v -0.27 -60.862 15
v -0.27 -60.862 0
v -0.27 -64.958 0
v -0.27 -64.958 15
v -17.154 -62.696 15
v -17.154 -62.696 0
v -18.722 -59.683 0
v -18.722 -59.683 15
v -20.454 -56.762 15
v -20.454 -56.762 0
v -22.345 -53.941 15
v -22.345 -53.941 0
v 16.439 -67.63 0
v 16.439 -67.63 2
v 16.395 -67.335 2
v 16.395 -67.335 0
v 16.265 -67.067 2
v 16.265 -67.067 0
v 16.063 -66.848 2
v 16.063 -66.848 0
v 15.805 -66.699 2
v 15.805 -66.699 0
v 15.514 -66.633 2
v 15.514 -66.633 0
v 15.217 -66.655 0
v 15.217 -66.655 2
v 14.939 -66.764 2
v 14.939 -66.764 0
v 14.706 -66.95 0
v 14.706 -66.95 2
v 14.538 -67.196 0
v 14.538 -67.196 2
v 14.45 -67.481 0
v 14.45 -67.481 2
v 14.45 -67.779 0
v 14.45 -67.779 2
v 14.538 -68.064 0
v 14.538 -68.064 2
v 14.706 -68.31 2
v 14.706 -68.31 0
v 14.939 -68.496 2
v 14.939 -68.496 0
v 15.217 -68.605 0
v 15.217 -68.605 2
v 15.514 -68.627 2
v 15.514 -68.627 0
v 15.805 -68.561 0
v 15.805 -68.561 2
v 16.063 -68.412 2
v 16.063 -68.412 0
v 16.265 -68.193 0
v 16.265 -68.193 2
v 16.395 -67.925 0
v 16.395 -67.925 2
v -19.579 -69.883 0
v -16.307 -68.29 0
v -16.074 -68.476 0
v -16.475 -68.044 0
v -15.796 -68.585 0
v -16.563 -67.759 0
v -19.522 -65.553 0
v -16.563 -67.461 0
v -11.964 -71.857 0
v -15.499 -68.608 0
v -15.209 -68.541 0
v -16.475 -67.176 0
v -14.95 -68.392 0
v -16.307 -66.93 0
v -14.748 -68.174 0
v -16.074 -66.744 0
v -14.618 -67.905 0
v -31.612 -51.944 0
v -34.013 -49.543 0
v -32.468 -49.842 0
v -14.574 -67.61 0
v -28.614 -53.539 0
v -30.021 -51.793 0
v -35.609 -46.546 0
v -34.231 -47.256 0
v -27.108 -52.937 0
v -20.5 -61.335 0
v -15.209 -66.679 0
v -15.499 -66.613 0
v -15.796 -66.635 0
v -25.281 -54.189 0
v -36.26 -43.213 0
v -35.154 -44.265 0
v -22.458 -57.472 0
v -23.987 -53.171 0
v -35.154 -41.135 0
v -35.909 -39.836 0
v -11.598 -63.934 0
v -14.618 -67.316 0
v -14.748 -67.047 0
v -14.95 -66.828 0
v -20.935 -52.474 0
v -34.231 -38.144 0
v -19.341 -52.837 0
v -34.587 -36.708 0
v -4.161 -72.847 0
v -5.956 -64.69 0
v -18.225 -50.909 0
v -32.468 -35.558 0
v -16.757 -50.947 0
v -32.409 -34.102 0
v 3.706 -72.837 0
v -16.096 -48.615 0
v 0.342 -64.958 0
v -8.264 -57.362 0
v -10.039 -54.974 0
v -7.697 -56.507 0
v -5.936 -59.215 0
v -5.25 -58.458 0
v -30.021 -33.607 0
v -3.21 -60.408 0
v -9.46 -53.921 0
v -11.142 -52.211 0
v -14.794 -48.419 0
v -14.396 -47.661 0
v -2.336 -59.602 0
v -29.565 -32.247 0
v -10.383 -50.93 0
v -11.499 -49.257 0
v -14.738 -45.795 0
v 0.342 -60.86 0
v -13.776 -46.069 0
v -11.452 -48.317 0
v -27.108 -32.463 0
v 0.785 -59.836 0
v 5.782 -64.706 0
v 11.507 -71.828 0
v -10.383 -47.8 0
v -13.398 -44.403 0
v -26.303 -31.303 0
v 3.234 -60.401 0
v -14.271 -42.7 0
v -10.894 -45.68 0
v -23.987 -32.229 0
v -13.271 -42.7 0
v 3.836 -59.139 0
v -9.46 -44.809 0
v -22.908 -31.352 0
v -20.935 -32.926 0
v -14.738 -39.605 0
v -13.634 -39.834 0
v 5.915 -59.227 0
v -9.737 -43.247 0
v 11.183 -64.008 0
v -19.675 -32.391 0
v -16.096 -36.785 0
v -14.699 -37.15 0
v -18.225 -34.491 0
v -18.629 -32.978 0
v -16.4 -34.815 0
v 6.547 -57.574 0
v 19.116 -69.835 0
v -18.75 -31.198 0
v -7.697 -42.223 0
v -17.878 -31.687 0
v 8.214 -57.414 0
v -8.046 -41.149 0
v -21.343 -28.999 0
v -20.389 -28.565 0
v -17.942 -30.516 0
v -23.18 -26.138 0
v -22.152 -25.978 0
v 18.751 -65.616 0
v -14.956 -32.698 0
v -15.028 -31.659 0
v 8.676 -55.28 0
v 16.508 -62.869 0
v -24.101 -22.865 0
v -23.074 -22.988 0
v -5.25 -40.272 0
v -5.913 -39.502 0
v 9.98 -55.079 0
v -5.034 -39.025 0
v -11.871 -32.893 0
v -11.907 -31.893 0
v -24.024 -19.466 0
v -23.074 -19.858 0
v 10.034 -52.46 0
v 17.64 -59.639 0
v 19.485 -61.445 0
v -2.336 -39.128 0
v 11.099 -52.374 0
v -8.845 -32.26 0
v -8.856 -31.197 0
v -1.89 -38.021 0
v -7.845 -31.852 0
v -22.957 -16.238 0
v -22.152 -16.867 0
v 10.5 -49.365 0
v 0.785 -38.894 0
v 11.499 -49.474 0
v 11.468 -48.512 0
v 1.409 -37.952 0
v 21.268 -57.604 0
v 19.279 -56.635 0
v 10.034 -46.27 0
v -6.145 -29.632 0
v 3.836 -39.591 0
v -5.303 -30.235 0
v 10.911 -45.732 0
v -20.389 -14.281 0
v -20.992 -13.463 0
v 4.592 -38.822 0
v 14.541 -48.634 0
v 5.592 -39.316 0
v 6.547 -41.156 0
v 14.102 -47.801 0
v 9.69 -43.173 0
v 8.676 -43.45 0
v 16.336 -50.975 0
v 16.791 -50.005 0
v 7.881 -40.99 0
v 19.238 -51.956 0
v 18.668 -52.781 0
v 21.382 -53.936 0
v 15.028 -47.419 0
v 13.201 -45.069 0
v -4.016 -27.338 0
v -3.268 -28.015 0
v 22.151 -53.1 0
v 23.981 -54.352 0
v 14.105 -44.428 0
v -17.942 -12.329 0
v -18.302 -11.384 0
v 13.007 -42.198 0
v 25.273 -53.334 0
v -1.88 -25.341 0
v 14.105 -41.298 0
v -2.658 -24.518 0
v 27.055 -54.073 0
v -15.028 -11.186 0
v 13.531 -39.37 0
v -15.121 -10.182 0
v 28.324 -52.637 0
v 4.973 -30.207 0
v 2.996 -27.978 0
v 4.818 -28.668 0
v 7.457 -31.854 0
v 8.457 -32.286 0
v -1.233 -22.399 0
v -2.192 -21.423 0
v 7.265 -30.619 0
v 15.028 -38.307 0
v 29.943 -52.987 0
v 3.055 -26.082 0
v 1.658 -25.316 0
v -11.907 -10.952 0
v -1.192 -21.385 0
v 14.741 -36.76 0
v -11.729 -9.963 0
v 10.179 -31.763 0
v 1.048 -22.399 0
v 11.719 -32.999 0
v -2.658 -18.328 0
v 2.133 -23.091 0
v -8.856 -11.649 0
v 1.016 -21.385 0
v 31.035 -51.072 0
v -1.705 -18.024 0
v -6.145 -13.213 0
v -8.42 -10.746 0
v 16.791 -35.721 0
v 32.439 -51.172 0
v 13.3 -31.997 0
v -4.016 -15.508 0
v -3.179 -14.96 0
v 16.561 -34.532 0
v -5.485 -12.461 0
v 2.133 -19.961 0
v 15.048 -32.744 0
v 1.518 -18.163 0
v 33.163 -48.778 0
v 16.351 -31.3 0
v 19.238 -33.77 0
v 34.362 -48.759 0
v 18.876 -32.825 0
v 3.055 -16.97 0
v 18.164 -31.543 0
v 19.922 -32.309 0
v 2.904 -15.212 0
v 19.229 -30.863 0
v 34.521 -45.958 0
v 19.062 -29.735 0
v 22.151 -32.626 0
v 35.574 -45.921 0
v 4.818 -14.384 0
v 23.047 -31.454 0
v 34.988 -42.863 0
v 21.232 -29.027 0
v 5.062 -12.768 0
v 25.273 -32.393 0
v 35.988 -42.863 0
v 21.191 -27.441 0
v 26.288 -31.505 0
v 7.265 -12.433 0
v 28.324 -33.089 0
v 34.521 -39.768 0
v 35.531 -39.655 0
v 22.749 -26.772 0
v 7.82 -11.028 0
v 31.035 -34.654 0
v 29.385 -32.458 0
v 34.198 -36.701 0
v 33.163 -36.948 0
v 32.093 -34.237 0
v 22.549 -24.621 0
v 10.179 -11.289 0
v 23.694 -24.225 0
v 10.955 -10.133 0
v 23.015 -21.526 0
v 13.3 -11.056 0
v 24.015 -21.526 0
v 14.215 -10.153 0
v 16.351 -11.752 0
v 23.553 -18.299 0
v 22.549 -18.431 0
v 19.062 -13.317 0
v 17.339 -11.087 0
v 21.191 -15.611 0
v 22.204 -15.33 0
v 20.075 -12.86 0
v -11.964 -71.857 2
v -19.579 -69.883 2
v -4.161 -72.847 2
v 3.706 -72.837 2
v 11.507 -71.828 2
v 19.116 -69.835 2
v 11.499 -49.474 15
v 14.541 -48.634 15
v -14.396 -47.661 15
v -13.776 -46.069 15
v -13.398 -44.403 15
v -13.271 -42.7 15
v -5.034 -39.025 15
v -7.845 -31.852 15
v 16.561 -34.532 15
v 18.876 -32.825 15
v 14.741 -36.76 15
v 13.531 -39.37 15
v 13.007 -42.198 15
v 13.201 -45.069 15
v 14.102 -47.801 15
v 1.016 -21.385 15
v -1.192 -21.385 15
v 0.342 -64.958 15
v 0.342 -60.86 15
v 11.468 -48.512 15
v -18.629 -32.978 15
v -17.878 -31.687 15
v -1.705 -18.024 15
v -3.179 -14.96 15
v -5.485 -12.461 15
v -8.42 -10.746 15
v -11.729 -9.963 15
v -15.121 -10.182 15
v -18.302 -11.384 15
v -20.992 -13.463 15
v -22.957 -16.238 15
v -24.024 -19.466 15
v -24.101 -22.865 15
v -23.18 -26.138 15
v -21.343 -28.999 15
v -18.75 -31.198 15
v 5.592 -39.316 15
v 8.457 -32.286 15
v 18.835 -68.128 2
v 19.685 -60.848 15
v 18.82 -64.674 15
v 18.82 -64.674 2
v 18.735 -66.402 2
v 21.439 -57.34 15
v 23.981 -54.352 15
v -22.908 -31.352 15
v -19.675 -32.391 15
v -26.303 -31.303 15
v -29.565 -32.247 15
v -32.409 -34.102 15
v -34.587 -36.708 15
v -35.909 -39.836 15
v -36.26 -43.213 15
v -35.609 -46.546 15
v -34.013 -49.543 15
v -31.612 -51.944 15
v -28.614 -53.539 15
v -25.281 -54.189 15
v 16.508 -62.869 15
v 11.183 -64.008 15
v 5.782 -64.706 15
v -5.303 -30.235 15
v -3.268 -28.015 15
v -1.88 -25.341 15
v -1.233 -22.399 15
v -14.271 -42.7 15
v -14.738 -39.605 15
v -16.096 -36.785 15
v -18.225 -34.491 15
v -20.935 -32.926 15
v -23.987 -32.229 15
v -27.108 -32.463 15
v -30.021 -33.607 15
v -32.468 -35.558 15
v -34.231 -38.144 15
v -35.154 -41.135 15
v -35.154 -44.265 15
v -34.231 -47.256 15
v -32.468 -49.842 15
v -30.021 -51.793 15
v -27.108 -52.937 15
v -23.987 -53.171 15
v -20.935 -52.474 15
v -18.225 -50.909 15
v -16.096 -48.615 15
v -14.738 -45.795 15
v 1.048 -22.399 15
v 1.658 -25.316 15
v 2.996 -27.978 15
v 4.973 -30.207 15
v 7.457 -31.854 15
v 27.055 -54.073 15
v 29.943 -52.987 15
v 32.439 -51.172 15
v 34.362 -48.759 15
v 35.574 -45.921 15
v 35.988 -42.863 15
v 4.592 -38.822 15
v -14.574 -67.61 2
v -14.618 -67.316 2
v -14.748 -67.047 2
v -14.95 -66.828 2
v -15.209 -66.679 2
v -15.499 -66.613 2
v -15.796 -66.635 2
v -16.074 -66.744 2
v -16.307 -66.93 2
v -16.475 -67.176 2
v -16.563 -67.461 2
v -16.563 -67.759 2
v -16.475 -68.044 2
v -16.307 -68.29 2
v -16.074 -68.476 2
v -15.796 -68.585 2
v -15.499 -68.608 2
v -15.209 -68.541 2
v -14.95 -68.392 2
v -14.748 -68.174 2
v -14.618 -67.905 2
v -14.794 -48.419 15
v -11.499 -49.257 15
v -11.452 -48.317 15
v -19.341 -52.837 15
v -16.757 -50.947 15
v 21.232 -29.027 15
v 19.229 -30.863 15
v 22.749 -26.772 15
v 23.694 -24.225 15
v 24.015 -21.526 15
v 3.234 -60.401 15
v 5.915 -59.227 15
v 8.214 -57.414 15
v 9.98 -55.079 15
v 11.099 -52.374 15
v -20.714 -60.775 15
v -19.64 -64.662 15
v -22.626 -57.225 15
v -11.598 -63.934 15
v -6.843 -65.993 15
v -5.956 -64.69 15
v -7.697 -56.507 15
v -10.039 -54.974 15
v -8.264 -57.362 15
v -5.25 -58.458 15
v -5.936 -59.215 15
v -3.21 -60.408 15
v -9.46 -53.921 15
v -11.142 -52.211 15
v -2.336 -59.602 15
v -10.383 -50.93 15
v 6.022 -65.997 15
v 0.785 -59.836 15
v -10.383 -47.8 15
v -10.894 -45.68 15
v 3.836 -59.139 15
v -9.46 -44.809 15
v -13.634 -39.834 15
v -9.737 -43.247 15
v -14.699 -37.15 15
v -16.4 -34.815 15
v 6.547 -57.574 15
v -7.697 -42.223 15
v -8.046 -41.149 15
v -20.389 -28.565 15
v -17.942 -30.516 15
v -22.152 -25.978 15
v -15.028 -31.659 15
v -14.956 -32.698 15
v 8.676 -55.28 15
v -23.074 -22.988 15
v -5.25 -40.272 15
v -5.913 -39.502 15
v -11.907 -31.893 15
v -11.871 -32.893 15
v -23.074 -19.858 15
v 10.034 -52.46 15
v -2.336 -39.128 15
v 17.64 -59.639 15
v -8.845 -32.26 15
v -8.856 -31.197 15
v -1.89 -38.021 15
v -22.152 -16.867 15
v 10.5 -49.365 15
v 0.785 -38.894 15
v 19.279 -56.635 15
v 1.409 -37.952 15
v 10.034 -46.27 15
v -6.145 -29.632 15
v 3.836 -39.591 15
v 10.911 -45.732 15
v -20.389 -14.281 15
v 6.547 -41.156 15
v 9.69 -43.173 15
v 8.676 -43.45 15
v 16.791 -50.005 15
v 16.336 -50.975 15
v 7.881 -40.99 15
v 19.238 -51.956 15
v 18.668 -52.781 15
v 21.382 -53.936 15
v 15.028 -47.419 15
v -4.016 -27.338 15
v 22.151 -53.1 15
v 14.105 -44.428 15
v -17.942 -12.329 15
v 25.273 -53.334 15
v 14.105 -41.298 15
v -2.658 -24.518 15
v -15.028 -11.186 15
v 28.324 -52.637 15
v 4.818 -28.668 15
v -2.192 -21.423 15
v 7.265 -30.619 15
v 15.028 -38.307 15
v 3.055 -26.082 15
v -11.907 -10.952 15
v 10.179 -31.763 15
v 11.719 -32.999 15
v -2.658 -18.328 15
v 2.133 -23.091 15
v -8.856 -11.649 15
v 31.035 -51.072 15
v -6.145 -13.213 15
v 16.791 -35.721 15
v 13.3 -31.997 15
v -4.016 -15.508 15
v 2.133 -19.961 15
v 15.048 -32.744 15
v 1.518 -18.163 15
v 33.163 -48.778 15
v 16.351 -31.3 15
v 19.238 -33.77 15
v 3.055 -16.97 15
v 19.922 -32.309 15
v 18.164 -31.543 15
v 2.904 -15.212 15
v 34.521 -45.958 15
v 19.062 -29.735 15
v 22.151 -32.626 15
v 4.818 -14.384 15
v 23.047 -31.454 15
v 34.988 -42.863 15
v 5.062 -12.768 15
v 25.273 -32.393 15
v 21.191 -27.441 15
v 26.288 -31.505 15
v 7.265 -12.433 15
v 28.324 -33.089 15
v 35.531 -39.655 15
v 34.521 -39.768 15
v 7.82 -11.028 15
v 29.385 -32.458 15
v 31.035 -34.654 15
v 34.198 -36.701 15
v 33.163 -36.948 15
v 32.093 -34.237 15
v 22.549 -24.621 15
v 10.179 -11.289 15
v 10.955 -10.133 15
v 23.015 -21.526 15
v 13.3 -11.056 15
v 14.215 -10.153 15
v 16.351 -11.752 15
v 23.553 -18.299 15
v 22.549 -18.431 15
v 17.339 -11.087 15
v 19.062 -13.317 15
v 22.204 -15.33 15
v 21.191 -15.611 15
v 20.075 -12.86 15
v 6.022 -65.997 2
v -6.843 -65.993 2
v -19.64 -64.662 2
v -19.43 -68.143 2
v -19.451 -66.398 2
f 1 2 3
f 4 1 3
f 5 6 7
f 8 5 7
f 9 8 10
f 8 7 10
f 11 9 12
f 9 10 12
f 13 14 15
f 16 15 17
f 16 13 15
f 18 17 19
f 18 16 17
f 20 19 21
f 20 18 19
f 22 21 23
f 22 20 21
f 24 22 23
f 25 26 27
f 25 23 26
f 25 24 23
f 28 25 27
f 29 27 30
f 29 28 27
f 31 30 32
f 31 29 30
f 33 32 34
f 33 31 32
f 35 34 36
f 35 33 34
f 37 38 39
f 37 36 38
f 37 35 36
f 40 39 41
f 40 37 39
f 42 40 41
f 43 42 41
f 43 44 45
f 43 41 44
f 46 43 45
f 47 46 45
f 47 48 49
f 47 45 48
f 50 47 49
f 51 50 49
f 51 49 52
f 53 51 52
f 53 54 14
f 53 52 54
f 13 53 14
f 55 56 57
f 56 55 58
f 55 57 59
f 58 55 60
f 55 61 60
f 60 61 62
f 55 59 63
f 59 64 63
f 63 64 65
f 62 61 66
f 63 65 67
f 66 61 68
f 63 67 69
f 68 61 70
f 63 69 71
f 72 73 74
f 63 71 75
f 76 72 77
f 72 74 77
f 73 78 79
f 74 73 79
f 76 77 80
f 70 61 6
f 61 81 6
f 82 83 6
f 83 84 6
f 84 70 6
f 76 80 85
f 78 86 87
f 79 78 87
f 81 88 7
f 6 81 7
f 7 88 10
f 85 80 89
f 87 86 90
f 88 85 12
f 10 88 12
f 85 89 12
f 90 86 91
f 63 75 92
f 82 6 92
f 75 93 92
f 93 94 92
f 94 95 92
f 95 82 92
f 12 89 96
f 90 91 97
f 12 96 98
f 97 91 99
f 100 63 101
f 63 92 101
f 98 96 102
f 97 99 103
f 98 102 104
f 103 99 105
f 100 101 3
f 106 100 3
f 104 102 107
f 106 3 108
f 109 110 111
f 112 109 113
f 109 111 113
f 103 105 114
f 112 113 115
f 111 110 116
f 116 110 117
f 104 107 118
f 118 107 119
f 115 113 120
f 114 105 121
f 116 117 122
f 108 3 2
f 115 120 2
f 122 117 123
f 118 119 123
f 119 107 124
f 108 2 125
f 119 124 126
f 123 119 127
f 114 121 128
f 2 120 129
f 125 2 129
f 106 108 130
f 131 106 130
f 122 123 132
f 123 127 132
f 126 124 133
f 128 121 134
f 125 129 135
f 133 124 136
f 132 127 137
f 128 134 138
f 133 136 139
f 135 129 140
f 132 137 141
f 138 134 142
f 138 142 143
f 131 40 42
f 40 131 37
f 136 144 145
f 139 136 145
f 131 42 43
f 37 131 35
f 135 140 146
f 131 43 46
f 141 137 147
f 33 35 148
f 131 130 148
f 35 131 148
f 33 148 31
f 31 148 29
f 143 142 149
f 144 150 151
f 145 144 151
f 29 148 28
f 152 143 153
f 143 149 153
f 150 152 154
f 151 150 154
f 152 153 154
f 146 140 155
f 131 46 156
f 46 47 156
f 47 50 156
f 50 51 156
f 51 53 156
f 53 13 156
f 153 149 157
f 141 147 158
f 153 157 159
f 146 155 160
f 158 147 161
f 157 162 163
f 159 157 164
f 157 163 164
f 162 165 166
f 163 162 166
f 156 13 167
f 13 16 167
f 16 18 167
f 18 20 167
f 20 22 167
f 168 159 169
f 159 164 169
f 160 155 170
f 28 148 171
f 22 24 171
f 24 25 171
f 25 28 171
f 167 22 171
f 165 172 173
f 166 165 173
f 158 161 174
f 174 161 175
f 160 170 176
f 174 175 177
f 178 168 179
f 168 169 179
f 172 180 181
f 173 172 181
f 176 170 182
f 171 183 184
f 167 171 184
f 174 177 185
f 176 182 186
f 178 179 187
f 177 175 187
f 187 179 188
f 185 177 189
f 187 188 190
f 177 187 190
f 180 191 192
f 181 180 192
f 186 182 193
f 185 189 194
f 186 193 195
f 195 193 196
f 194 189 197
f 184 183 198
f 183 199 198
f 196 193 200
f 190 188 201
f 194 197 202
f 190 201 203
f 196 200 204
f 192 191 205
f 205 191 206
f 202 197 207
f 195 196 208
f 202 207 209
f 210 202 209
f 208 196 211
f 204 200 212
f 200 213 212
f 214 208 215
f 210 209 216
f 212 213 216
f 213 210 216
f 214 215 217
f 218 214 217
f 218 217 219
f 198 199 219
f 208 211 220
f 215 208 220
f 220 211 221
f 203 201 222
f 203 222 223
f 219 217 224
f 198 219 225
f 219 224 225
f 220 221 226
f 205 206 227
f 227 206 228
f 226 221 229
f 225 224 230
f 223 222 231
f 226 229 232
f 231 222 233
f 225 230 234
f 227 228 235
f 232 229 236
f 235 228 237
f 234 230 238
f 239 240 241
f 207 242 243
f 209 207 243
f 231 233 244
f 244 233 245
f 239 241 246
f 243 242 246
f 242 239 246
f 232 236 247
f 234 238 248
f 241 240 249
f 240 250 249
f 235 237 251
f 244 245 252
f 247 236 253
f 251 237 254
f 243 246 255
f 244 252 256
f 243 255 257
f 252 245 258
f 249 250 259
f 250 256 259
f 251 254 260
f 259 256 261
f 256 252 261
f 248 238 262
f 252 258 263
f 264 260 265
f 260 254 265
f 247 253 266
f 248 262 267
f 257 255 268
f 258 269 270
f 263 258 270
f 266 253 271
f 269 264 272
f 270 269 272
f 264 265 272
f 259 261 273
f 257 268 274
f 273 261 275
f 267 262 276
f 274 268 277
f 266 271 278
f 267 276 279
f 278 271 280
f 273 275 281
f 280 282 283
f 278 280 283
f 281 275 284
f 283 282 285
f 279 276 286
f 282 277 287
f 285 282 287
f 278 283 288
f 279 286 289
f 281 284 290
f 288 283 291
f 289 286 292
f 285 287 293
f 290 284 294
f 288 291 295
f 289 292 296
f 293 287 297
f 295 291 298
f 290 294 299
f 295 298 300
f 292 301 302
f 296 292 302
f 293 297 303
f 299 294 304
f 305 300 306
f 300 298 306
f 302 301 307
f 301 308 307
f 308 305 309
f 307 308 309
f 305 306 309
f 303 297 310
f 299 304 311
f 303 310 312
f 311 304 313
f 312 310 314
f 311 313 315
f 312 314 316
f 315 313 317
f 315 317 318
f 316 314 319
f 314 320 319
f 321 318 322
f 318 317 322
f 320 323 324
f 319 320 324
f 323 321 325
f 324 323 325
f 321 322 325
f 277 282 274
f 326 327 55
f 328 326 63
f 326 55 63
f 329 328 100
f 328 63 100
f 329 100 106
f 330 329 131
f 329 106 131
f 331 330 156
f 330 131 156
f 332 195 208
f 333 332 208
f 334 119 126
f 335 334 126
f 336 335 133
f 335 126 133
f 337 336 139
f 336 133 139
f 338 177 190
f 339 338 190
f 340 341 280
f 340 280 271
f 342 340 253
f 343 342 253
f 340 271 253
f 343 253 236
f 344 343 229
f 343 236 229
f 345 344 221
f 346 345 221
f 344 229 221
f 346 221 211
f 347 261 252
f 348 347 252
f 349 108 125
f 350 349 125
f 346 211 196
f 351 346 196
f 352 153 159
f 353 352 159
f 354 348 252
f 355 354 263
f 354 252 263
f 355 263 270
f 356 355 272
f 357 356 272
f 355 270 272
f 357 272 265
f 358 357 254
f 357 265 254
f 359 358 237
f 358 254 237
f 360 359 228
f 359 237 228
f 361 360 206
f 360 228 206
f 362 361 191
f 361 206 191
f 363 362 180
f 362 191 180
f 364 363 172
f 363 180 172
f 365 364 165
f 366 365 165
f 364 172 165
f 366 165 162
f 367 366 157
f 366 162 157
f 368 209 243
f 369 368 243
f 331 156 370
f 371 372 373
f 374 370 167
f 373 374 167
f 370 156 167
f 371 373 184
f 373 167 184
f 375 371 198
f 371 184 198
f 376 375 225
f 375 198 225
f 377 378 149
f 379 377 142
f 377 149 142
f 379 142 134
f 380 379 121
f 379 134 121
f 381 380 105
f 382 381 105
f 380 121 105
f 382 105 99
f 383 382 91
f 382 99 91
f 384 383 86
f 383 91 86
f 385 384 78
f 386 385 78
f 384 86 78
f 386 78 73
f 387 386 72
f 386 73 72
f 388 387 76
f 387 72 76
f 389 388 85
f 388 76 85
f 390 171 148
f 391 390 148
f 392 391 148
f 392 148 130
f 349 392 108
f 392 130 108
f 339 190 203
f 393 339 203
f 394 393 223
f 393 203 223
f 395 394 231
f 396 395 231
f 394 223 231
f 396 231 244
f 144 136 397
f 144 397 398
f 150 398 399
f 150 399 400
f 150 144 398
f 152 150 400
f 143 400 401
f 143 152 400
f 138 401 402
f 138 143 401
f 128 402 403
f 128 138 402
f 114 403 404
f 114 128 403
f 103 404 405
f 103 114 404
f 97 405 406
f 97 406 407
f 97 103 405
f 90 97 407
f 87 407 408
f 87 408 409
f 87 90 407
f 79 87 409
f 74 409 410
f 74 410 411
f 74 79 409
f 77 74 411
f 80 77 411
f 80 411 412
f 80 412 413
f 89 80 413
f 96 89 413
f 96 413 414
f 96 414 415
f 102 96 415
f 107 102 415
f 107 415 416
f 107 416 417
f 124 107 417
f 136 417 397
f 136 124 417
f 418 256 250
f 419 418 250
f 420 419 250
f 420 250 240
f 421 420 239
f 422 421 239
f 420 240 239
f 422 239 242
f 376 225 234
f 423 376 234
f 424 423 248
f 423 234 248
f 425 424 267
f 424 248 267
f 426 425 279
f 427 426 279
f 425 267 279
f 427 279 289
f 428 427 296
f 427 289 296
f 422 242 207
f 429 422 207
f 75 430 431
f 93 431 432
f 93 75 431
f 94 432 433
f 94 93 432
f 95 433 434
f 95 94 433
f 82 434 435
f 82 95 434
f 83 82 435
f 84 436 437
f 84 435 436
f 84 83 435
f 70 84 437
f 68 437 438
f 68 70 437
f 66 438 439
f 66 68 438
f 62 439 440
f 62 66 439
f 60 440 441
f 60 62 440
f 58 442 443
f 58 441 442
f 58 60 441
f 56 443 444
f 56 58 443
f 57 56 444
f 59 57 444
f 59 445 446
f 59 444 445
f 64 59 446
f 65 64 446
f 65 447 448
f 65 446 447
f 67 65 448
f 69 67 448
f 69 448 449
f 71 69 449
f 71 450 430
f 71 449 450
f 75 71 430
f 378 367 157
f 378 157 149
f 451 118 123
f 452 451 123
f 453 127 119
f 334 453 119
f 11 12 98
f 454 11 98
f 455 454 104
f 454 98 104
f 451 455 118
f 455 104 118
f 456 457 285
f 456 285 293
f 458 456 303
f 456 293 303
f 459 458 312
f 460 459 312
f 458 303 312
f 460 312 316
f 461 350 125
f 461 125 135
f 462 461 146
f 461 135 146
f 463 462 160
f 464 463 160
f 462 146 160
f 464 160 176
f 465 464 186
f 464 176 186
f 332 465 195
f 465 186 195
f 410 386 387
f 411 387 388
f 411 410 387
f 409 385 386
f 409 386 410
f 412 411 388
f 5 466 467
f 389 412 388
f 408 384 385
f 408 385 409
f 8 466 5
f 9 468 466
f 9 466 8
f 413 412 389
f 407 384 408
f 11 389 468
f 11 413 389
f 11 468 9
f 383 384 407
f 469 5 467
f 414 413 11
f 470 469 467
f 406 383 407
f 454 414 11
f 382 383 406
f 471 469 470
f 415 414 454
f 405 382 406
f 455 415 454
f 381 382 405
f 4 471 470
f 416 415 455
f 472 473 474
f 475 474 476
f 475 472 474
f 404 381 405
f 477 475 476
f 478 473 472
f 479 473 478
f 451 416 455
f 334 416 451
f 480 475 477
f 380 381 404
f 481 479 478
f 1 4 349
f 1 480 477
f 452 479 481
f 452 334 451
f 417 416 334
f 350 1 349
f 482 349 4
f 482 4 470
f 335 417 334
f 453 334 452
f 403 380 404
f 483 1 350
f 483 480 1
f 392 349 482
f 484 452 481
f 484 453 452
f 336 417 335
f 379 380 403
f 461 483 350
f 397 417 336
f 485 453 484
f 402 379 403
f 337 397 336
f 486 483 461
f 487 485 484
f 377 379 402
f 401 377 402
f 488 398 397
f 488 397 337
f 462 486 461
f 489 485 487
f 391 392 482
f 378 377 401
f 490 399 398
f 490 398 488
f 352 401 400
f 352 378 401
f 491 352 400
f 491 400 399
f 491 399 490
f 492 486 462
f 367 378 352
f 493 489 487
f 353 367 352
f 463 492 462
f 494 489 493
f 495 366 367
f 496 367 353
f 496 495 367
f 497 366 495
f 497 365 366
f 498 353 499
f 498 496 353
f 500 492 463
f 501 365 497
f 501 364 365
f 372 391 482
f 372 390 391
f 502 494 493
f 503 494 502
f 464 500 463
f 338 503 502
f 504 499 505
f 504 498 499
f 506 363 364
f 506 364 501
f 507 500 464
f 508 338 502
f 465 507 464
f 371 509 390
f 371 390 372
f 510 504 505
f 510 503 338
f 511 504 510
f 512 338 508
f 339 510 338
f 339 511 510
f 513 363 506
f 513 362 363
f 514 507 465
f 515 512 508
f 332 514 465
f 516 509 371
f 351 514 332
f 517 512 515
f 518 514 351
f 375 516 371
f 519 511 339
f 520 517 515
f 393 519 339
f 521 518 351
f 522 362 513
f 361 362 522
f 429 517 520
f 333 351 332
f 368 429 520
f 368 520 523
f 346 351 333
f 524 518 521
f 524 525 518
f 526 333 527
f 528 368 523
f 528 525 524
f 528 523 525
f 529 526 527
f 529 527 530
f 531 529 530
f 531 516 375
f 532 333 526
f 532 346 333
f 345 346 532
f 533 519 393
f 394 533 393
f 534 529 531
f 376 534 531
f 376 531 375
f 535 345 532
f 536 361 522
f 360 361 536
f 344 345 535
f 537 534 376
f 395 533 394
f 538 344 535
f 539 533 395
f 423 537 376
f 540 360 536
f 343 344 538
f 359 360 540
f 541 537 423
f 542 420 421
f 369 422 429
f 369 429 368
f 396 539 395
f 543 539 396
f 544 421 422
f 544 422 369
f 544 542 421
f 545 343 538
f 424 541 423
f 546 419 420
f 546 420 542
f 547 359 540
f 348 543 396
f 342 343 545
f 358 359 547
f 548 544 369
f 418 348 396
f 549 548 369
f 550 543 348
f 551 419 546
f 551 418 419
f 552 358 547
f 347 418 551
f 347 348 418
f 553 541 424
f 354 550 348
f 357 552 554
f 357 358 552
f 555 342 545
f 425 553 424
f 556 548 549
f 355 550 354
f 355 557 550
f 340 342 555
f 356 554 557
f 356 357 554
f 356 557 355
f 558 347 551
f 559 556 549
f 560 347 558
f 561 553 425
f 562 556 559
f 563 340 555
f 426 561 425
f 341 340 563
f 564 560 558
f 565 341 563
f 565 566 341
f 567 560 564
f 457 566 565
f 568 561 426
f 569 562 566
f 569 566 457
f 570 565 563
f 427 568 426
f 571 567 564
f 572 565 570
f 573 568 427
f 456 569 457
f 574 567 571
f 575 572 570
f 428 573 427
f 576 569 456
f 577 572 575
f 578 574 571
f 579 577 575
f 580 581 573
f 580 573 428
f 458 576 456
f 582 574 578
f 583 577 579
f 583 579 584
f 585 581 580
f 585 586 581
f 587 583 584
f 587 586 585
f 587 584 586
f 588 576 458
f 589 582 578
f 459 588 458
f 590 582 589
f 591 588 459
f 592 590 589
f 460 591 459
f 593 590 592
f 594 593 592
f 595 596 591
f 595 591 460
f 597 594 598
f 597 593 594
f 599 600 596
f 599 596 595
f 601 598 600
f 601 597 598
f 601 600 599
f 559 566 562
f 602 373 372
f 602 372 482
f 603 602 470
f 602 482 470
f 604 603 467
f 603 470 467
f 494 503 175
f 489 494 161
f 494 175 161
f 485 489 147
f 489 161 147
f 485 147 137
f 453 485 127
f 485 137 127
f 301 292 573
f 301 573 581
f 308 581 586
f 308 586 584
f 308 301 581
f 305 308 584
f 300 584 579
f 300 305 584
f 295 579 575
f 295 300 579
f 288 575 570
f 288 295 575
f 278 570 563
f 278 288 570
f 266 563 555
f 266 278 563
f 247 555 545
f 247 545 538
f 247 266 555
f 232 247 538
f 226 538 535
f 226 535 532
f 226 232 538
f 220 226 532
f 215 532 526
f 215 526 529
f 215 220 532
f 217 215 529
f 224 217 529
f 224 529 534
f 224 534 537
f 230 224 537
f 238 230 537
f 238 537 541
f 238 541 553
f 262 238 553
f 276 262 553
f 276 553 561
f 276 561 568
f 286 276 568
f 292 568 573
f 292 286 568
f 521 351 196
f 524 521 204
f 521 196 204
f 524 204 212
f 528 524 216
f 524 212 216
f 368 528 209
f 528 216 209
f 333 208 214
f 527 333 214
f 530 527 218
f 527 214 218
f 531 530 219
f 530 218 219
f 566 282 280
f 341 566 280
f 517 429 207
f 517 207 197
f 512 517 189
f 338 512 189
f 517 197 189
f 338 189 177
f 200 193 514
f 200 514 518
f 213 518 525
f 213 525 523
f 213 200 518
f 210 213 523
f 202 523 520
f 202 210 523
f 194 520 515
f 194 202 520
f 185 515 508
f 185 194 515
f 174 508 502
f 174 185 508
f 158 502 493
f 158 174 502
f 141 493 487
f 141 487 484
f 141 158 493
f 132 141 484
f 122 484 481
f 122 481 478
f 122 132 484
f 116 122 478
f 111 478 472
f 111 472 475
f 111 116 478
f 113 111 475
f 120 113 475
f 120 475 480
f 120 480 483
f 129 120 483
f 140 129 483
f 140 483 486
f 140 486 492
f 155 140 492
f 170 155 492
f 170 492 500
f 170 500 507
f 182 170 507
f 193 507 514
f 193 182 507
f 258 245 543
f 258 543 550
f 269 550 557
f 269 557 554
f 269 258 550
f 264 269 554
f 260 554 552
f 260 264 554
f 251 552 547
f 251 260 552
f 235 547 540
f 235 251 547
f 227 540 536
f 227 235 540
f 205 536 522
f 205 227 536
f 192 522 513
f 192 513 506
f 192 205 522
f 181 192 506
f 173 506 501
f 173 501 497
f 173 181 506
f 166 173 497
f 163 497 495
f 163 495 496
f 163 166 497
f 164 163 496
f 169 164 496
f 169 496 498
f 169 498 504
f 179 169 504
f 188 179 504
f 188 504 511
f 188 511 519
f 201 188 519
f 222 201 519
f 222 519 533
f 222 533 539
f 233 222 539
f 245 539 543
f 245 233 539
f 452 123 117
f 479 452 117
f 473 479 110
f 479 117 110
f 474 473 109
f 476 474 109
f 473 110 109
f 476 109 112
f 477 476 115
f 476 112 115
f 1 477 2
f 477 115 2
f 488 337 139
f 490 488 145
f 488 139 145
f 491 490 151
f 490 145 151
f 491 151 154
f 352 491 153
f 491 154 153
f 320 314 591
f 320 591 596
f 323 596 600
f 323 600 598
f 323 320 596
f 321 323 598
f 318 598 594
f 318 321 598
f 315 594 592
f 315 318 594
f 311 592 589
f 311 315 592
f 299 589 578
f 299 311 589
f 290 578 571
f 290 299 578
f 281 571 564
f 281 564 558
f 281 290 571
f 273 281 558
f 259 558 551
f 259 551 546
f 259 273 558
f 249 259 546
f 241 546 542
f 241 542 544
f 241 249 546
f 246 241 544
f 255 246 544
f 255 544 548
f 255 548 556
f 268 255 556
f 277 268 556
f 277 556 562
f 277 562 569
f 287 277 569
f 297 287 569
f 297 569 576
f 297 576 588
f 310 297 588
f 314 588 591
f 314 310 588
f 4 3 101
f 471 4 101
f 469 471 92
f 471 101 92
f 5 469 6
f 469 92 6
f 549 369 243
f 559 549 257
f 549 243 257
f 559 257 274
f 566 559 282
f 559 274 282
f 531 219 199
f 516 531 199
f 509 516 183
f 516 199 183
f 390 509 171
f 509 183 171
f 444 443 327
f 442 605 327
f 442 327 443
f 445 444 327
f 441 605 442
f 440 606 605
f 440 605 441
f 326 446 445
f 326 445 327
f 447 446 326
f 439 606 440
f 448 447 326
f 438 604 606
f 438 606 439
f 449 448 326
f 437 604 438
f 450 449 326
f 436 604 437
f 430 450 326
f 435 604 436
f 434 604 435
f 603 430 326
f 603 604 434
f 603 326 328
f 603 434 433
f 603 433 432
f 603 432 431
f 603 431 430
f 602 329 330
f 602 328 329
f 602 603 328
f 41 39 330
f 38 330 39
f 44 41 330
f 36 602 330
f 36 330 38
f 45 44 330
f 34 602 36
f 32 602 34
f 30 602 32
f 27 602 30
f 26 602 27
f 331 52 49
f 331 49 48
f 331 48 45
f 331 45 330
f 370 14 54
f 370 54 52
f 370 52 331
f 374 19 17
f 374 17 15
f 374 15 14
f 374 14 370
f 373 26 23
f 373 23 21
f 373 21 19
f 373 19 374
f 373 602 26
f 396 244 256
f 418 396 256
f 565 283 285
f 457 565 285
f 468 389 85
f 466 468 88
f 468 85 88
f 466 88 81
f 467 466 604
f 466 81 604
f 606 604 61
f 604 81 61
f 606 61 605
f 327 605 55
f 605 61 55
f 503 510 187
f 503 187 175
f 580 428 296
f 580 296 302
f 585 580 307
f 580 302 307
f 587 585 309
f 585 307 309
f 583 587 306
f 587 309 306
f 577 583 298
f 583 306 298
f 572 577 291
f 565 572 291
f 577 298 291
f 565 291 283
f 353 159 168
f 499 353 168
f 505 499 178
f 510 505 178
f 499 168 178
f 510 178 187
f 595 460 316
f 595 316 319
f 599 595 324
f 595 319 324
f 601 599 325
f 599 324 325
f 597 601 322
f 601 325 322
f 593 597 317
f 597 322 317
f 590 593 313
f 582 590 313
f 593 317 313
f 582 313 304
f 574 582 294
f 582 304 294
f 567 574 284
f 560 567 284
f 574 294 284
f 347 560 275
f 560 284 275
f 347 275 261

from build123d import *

# Parameters (mm, degrees)
F0_R     = 10.5
F0_R_2   = 1
F1_DEPTH = 15
F3_DEPTH = 13


# Not quite as in the source:
# - a feature names something its author has since deleted; it is built from what else it names


with BuildPart() as f1:
    # F0 (on Top) → F1 (new body)
    with BuildSketch(Plane.XY):
        with BuildLine():
            ThreePointArc((8.456539156, -32.2861623243), (7.9514162152, -32.0818291381), (7.456539156, -31.853798586))
            Line((7.456539156, -31.853798586), (4.5923320267, -38.8217959812))
            ThreePointArc((4.5923320267, -38.8217959812), (5.0983332026, -39.0569597997), (5.5923320267, -39.3163906642))
            Line((5.5923320267, -39.3163906642), (8.456539156, -32.2861623243))
        make_face()
        with BuildLine():
            ThreePointArc((5.5923320267, -39.3163906642), (5.0983332026, -39.0569597997), (4.5923320267, -38.8217959812))
            ThreePointArc((4.5923320267, -38.8217959812), (-0.2431846168, -37.8676348758), (-5.0340313362, -39.025405292))
            ThreePointArc((-5.0340313362, -39.025405292), (-5.4788213716, -39.2540536763), (-5.9132495676, -39.5018245418))
            ThreePointArc((-5.9132495676, -39.5018245418), (-9.7372709203, -43.2466031538), (-11.4521142662, -48.3166937306))
            ThreePointArc((-11.4521142662, -48.3166937306), (-11.4854214601, -48.7861903947), (-11.4994890326, -49.2566567486))
            ThreePointArc((-11.4994890326, -49.2566567486), (-8.2643935059, -57.3619252212), (-0.2699309272, -60.8618949578))
            ThreePointArc((-0.2699309272, -60.8618949578), (0.0361142384, -60.8650066318), (0.3421338242, -60.8599728394))
            ThreePointArc((0.3421338242, -60.8599728394), (8.2138697006, -57.4138113488), (11.4994866281, -49.473724691))
            ThreePointArc((11.4994866281, -49.473724691), (11.4998716563, -49.4193946208), (11.5, -49.365063338))
            ThreePointArc((11.5, -49.365063338), (11.4920706677, -48.9380835162), (11.4682936055, -48.5116925056))
            ThreePointArc((11.4682936055, -48.5116925056), (9.6904401721, -43.1726995509), (5.5923320267, -39.3163906642))
        make_face()
        with Locations((0, -49.365063338)):
            Circle(F0_R, mode=Mode.SUBTRACT)
        with BuildLine():
            Line((-5.0340313362, -39.025405292), (-7.8453759782, -31.8516950865))
            ThreePointArc((-7.8453759782, -31.8516950865), (-8.3405737258, -32.0678131455), (-8.8453759782, -32.2604332653))
            Line((-8.8453759782, -32.2604332653), (-5.9132495676, -39.5018245418))
            ThreePointArc((-5.9132495676, -39.5018245418), (-5.4788213716, -39.2540536763), (-5.0340313362, -39.025405292))
        make_face()
        with BuildLine():
            ThreePointArc((-11.4994890326, -49.2566567486), (-11.4854214601, -48.7861903947), (-11.4521142662, -48.3166937306))
            Line((-11.4521142662, -48.3166937306), (-14.3962585951, -47.6607659595))
            ThreePointArc((-14.3962585951, -47.6607659595), (-14.5881725993, -48.0436522978), (-14.7942107467, -48.4191269505))
            Line((-14.7942107467, -48.4191269505), (-11.4994890326, -49.2566567486))
        make_face()
        with BuildLine():
            Line((0.3421338242, -64.957754564), (0.3421338242, -60.8599728394))
            ThreePointArc((0.3421338242, -60.8599728394), (0.0361142384, -60.8650066318), (-0.2699309272, -60.8618949578))
            Line((-0.2699309272, -60.8618949578), (-0.2699309272, -64.9580295419))
            ThreePointArc((-0.2699309272, -64.9580295419), (0.0361017663, -64.9585994764), (0.3421338242, -64.957754564))
        make_face()
        with BuildLine():
            ThreePointArc((14.5406251326, -48.6339542886), (14.3126656094, -48.2217915649), (14.1017745949, -47.8006400066))
            Line((14.1017745949, -47.8006400066), (11.4682936055, -48.5116925056))
            ThreePointArc((11.4682936055, -48.5116925056), (11.4920706677, -48.9380835162), (11.5, -49.365063338))
            ThreePointArc((11.5, -49.365063338), (11.4998716563, -49.4193946208), (11.4994866281, -49.473724691))
            Line((11.4994866281, -49.473724691), (14.5406251326, -48.6339542886))
        make_face()
        with BuildLine():
            ThreePointArc((-18.6290237609, -32.9777593238), (-19.1442423903, -32.6707574729), (-19.6747657372, -32.391033768))
            ThreePointArc((-19.6747657372, -32.391033768), (-35.9088169714, -39.8355359758), (-25.2809881049, -54.1887337442))
            ThreePointArc((-25.2809881049, -54.1887337442), (-23.804958589, -54.1593636462), (-22.3448544462, -53.9411398473))
            ThreePointArc((-22.3448544462, -53.9411398473), (-17.9826996587, -51.9825521015), (-14.7942107467, -48.4191269505))
            ThreePointArc((-14.7942107467, -48.4191269505), (-14.5881725993, -48.0436522978), (-14.3962585951, -47.6607659595))
            ThreePointArc((-14.3962585951, -47.6607659595), (-13.5560532822, -45.2433801805), (-13.2712837616, -42.7000348848))
            ThreePointArc((-13.2712837616, -42.7000348848), (-14.6993924296, -37.1496290442), (-18.6290237609, -32.9777593238))
        make_face()
        with Locations((-24.7712837616, -42.7000348848)):
            Circle(F0_R, mode=Mode.SUBTRACT)
        with BuildLine():
            ThreePointArc((19.1164688634, -69.8349915238), (19.4845895022, -61.444857772), (23.9814303791, -54.3520248186))
            ThreePointArc((23.9814303791, -54.3520248186), (22.6698061738, -54.2185580929), (21.3820772546, -53.9358468382))
            ThreePointArc((21.3820772546, -53.9358468382), (18.3981233109, -58.1037903348), (16.5083411563, -62.8687098028))
            ThreePointArc((16.5083411563, -62.8687098028), (8.4897865212, -64.4127490141), (0.3421338242, -64.957754564))
            ThreePointArc((0.3421338242, -64.957754564), (0.0361017663, -64.9585994764), (-0.2699309272, -64.9580295419))
            ThreePointArc((-0.2699309272, -64.9580295419), (-8.785207594, -64.3721937184), (-17.154313878, -62.6955302663))
            ThreePointArc((-17.154313878, -62.6955302663), (-19.5673016908, -58.2102584784), (-22.3448544462, -53.9411398473))
            ThreePointArc((-22.3448544462, -53.9411398473), (-23.804958589, -54.1593636462), (-25.2809881049, -54.1887337442))
            ThreePointArc((-25.2809881049, -54.1887337442), (-20.5000187239, -61.334576051), (-19.5788875855, -69.8828067405))
            ThreePointArc((-19.5788875855, -69.8828067405), (-0.2273681462, -72.9674740069), (19.1164688634, -69.8349915238))
        make_face()
        with Locations((-15.5739570037, -67.6103085279)):
            Circle(F0_R_2, mode=Mode.SUBTRACT)
        with Locations((15.4391750693, -67.6299035549)):
            Circle(F0_R_2, mode=Mode.SUBTRACT)
        with BuildLine():
            ThreePointArc((-1.1916347077, -21.4227077758), (-1.1916502185, -21.4038200259), (-1.1916967507, -21.384932327))
            ThreePointArc((-1.1916967507, -21.384932327), (-18.3019531043, -11.3840660604), (-18.7497462956, -31.1976391816))
            ThreePointArc((-18.7497462956, -31.1976391816), (-18.319020566, -31.4517919016), (-17.8776520238, -31.6869770823))
            ThreePointArc((-17.8776520238, -31.6869770823), (-13.4202987359, -32.8995997215), (-8.8453759782, -32.2604332653))
            ThreePointArc((-8.8453759782, -32.2604332653), (-8.3405737258, -32.0678131455), (-7.8453759782, -31.8516950865))
            ThreePointArc((-7.8453759782, -31.8516950865), (-3.2683745706, -28.0145336524), (-1.2331773275, -22.3993113114))
            ThreePointArc((-1.2331773275, -22.3993113114), (-1.2020250565, -21.9114511274), (-1.1916347077, -21.4227077758))
        make_face()
        with Locations((-12.6916347077, -21.4227077758)):
            Circle(F0_R, mode=Mode.SUBTRACT)
        with BuildLine():
            ThreePointArc((-17.8776520238, -31.6869770823), (-18.319020566, -31.4517919016), (-18.7497462956, -31.1976391816))
            Line((-18.7497462956, -31.1976391816), (-19.6747657372, -32.391033768))
            ThreePointArc((-19.6747657372, -32.391033768), (-19.1442423903, -32.6707574729), (-18.6290237609, -32.9777593238))
            Line((-18.6290237609, -32.9777593238), (-17.8776520238, -31.6869770823))
        make_face()
        with BuildLine():
            ThreePointArc((1.0484752677, -22.3993113114), (1.0211177974, -21.8924785724), (1.0161513841, -21.384932327))
            Line((1.0161513841, -21.384932327), (-1.1916967507, -21.384932327))
            ThreePointArc((-1.1916967507, -21.384932327), (-1.1916502185, -21.4038200259), (-1.1916347077, -21.4227077758))
            ThreePointArc((-1.1916347077, -21.4227077758), (-1.2020250565, -21.9114511274), (-1.2331773275, -22.3993113114))
            Line((-1.2331773275, -22.3993113114), (1.0484752677, -22.3993113114))
        make_face()
        with BuildLine():
            ThreePointArc((19.2285761762, -30.8633233175), (22.7488768974, -26.7724999097), (24.0152835635, -21.5262090793))
            ThreePointArc((24.0152835635, -21.5262090793), (12.5859232723, -10.0264260365), (1.0161513841, -21.384932327))
            ThreePointArc((1.0161513841, -21.384932327), (1.0211177974, -21.8924785724), (1.0484752677, -22.3993113114))
            ThreePointArc((1.0484752677, -22.3993113114), (2.9958137546, -27.97831684), (7.456539156, -31.853798586))
            ThreePointArc((7.456539156, -31.853798586), (7.9514162152, -32.0818291381), (8.456539156, -32.2861623243))
            ThreePointArc((8.456539156, -32.2861623243), (13.3927953164, -32.9926807739), (18.1640607336, -31.5432603661))
            ThreePointArc((18.1640607336, -31.5432603661), (18.7056608481, -31.2179183751), (19.2285761762, -30.8633233175))
        make_face()
        with Locations((12.5152835635, -21.5262090793)):
            Circle(F0_R, mode=Mode.SUBTRACT)
        with BuildLine():
            Line((19.9216749616, -32.3085805793), (19.2285761762, -30.8633233175))
            ThreePointArc((19.2285761762, -30.8633233175), (18.7056608481, -31.2179183751), (18.1640607336, -31.5432603661))
            Line((18.1640607336, -31.5432603661), (18.8762154015, -32.8253023654))
            ThreePointArc((18.8762154015, -32.8253023654), (19.3923910412, -32.5536807799), (19.9216749616, -32.3085805793))
        make_face()
        with BuildLine():
            ThreePointArc((35.9878958911, -42.8631827235), (30.8021044444, -33.251691146), (19.9216749616, -32.3085805793))
            ThreePointArc((19.9216749616, -32.3085805793), (19.3923910412, -32.5536807799), (18.8762154015, -32.8253023654))
            ThreePointArc((18.8762154015, -32.8253023654), (13.5312723299, -39.3699893221), (14.1017745949, -47.8006400066))
            ThreePointArc((14.1017745949, -47.8006400066), (14.3126656094, -48.2217915649), (14.5406251326, -48.6339542886))
            ThreePointArc((14.5406251326, -48.6339542886), (17.4435150212, -51.9531056143), (21.3820772546, -53.9358468382))
            ThreePointArc((21.3820772546, -53.9358468382), (22.6698061738, -54.2185580929), (23.9814303791, -54.3520248186))
            ThreePointArc((23.9814303791, -54.3520248186), (32.4385451291, -51.1720440591), (35.9878958911, -42.8631827235))
        make_face()
        with Locations((24.4878958911, -42.8631827235)):
            Circle(F0_R, mode=Mode.SUBTRACT)
    extrude(amount=F1_DEPTH)

    # F2 (on face) → F3 (cut)
    with BuildSketch(Plane.XY.offset(15)):
        with BuildLine():
            Line((-25.4734057233, -63.6063340564), (-25.4734057233, -67.6063340564))
            ThreePointArc((-25.4734057233, -67.6063340564), (-0.2376476142, -73.3314436205), (24.9858820328, -67.5526964371))
            Line((24.9858820328, -67.5526964371), (24.9858820328, -63.5526964371))
            ThreePointArc((24.9858820328, -63.5526964371), (-0.2410172674, -66.1614613713), (-25.4734057233, -63.6063340564))
        make_face()
    extrude(amount=-F3_DEPTH, mode=Mode.SUBTRACT)


solid = f1.part
